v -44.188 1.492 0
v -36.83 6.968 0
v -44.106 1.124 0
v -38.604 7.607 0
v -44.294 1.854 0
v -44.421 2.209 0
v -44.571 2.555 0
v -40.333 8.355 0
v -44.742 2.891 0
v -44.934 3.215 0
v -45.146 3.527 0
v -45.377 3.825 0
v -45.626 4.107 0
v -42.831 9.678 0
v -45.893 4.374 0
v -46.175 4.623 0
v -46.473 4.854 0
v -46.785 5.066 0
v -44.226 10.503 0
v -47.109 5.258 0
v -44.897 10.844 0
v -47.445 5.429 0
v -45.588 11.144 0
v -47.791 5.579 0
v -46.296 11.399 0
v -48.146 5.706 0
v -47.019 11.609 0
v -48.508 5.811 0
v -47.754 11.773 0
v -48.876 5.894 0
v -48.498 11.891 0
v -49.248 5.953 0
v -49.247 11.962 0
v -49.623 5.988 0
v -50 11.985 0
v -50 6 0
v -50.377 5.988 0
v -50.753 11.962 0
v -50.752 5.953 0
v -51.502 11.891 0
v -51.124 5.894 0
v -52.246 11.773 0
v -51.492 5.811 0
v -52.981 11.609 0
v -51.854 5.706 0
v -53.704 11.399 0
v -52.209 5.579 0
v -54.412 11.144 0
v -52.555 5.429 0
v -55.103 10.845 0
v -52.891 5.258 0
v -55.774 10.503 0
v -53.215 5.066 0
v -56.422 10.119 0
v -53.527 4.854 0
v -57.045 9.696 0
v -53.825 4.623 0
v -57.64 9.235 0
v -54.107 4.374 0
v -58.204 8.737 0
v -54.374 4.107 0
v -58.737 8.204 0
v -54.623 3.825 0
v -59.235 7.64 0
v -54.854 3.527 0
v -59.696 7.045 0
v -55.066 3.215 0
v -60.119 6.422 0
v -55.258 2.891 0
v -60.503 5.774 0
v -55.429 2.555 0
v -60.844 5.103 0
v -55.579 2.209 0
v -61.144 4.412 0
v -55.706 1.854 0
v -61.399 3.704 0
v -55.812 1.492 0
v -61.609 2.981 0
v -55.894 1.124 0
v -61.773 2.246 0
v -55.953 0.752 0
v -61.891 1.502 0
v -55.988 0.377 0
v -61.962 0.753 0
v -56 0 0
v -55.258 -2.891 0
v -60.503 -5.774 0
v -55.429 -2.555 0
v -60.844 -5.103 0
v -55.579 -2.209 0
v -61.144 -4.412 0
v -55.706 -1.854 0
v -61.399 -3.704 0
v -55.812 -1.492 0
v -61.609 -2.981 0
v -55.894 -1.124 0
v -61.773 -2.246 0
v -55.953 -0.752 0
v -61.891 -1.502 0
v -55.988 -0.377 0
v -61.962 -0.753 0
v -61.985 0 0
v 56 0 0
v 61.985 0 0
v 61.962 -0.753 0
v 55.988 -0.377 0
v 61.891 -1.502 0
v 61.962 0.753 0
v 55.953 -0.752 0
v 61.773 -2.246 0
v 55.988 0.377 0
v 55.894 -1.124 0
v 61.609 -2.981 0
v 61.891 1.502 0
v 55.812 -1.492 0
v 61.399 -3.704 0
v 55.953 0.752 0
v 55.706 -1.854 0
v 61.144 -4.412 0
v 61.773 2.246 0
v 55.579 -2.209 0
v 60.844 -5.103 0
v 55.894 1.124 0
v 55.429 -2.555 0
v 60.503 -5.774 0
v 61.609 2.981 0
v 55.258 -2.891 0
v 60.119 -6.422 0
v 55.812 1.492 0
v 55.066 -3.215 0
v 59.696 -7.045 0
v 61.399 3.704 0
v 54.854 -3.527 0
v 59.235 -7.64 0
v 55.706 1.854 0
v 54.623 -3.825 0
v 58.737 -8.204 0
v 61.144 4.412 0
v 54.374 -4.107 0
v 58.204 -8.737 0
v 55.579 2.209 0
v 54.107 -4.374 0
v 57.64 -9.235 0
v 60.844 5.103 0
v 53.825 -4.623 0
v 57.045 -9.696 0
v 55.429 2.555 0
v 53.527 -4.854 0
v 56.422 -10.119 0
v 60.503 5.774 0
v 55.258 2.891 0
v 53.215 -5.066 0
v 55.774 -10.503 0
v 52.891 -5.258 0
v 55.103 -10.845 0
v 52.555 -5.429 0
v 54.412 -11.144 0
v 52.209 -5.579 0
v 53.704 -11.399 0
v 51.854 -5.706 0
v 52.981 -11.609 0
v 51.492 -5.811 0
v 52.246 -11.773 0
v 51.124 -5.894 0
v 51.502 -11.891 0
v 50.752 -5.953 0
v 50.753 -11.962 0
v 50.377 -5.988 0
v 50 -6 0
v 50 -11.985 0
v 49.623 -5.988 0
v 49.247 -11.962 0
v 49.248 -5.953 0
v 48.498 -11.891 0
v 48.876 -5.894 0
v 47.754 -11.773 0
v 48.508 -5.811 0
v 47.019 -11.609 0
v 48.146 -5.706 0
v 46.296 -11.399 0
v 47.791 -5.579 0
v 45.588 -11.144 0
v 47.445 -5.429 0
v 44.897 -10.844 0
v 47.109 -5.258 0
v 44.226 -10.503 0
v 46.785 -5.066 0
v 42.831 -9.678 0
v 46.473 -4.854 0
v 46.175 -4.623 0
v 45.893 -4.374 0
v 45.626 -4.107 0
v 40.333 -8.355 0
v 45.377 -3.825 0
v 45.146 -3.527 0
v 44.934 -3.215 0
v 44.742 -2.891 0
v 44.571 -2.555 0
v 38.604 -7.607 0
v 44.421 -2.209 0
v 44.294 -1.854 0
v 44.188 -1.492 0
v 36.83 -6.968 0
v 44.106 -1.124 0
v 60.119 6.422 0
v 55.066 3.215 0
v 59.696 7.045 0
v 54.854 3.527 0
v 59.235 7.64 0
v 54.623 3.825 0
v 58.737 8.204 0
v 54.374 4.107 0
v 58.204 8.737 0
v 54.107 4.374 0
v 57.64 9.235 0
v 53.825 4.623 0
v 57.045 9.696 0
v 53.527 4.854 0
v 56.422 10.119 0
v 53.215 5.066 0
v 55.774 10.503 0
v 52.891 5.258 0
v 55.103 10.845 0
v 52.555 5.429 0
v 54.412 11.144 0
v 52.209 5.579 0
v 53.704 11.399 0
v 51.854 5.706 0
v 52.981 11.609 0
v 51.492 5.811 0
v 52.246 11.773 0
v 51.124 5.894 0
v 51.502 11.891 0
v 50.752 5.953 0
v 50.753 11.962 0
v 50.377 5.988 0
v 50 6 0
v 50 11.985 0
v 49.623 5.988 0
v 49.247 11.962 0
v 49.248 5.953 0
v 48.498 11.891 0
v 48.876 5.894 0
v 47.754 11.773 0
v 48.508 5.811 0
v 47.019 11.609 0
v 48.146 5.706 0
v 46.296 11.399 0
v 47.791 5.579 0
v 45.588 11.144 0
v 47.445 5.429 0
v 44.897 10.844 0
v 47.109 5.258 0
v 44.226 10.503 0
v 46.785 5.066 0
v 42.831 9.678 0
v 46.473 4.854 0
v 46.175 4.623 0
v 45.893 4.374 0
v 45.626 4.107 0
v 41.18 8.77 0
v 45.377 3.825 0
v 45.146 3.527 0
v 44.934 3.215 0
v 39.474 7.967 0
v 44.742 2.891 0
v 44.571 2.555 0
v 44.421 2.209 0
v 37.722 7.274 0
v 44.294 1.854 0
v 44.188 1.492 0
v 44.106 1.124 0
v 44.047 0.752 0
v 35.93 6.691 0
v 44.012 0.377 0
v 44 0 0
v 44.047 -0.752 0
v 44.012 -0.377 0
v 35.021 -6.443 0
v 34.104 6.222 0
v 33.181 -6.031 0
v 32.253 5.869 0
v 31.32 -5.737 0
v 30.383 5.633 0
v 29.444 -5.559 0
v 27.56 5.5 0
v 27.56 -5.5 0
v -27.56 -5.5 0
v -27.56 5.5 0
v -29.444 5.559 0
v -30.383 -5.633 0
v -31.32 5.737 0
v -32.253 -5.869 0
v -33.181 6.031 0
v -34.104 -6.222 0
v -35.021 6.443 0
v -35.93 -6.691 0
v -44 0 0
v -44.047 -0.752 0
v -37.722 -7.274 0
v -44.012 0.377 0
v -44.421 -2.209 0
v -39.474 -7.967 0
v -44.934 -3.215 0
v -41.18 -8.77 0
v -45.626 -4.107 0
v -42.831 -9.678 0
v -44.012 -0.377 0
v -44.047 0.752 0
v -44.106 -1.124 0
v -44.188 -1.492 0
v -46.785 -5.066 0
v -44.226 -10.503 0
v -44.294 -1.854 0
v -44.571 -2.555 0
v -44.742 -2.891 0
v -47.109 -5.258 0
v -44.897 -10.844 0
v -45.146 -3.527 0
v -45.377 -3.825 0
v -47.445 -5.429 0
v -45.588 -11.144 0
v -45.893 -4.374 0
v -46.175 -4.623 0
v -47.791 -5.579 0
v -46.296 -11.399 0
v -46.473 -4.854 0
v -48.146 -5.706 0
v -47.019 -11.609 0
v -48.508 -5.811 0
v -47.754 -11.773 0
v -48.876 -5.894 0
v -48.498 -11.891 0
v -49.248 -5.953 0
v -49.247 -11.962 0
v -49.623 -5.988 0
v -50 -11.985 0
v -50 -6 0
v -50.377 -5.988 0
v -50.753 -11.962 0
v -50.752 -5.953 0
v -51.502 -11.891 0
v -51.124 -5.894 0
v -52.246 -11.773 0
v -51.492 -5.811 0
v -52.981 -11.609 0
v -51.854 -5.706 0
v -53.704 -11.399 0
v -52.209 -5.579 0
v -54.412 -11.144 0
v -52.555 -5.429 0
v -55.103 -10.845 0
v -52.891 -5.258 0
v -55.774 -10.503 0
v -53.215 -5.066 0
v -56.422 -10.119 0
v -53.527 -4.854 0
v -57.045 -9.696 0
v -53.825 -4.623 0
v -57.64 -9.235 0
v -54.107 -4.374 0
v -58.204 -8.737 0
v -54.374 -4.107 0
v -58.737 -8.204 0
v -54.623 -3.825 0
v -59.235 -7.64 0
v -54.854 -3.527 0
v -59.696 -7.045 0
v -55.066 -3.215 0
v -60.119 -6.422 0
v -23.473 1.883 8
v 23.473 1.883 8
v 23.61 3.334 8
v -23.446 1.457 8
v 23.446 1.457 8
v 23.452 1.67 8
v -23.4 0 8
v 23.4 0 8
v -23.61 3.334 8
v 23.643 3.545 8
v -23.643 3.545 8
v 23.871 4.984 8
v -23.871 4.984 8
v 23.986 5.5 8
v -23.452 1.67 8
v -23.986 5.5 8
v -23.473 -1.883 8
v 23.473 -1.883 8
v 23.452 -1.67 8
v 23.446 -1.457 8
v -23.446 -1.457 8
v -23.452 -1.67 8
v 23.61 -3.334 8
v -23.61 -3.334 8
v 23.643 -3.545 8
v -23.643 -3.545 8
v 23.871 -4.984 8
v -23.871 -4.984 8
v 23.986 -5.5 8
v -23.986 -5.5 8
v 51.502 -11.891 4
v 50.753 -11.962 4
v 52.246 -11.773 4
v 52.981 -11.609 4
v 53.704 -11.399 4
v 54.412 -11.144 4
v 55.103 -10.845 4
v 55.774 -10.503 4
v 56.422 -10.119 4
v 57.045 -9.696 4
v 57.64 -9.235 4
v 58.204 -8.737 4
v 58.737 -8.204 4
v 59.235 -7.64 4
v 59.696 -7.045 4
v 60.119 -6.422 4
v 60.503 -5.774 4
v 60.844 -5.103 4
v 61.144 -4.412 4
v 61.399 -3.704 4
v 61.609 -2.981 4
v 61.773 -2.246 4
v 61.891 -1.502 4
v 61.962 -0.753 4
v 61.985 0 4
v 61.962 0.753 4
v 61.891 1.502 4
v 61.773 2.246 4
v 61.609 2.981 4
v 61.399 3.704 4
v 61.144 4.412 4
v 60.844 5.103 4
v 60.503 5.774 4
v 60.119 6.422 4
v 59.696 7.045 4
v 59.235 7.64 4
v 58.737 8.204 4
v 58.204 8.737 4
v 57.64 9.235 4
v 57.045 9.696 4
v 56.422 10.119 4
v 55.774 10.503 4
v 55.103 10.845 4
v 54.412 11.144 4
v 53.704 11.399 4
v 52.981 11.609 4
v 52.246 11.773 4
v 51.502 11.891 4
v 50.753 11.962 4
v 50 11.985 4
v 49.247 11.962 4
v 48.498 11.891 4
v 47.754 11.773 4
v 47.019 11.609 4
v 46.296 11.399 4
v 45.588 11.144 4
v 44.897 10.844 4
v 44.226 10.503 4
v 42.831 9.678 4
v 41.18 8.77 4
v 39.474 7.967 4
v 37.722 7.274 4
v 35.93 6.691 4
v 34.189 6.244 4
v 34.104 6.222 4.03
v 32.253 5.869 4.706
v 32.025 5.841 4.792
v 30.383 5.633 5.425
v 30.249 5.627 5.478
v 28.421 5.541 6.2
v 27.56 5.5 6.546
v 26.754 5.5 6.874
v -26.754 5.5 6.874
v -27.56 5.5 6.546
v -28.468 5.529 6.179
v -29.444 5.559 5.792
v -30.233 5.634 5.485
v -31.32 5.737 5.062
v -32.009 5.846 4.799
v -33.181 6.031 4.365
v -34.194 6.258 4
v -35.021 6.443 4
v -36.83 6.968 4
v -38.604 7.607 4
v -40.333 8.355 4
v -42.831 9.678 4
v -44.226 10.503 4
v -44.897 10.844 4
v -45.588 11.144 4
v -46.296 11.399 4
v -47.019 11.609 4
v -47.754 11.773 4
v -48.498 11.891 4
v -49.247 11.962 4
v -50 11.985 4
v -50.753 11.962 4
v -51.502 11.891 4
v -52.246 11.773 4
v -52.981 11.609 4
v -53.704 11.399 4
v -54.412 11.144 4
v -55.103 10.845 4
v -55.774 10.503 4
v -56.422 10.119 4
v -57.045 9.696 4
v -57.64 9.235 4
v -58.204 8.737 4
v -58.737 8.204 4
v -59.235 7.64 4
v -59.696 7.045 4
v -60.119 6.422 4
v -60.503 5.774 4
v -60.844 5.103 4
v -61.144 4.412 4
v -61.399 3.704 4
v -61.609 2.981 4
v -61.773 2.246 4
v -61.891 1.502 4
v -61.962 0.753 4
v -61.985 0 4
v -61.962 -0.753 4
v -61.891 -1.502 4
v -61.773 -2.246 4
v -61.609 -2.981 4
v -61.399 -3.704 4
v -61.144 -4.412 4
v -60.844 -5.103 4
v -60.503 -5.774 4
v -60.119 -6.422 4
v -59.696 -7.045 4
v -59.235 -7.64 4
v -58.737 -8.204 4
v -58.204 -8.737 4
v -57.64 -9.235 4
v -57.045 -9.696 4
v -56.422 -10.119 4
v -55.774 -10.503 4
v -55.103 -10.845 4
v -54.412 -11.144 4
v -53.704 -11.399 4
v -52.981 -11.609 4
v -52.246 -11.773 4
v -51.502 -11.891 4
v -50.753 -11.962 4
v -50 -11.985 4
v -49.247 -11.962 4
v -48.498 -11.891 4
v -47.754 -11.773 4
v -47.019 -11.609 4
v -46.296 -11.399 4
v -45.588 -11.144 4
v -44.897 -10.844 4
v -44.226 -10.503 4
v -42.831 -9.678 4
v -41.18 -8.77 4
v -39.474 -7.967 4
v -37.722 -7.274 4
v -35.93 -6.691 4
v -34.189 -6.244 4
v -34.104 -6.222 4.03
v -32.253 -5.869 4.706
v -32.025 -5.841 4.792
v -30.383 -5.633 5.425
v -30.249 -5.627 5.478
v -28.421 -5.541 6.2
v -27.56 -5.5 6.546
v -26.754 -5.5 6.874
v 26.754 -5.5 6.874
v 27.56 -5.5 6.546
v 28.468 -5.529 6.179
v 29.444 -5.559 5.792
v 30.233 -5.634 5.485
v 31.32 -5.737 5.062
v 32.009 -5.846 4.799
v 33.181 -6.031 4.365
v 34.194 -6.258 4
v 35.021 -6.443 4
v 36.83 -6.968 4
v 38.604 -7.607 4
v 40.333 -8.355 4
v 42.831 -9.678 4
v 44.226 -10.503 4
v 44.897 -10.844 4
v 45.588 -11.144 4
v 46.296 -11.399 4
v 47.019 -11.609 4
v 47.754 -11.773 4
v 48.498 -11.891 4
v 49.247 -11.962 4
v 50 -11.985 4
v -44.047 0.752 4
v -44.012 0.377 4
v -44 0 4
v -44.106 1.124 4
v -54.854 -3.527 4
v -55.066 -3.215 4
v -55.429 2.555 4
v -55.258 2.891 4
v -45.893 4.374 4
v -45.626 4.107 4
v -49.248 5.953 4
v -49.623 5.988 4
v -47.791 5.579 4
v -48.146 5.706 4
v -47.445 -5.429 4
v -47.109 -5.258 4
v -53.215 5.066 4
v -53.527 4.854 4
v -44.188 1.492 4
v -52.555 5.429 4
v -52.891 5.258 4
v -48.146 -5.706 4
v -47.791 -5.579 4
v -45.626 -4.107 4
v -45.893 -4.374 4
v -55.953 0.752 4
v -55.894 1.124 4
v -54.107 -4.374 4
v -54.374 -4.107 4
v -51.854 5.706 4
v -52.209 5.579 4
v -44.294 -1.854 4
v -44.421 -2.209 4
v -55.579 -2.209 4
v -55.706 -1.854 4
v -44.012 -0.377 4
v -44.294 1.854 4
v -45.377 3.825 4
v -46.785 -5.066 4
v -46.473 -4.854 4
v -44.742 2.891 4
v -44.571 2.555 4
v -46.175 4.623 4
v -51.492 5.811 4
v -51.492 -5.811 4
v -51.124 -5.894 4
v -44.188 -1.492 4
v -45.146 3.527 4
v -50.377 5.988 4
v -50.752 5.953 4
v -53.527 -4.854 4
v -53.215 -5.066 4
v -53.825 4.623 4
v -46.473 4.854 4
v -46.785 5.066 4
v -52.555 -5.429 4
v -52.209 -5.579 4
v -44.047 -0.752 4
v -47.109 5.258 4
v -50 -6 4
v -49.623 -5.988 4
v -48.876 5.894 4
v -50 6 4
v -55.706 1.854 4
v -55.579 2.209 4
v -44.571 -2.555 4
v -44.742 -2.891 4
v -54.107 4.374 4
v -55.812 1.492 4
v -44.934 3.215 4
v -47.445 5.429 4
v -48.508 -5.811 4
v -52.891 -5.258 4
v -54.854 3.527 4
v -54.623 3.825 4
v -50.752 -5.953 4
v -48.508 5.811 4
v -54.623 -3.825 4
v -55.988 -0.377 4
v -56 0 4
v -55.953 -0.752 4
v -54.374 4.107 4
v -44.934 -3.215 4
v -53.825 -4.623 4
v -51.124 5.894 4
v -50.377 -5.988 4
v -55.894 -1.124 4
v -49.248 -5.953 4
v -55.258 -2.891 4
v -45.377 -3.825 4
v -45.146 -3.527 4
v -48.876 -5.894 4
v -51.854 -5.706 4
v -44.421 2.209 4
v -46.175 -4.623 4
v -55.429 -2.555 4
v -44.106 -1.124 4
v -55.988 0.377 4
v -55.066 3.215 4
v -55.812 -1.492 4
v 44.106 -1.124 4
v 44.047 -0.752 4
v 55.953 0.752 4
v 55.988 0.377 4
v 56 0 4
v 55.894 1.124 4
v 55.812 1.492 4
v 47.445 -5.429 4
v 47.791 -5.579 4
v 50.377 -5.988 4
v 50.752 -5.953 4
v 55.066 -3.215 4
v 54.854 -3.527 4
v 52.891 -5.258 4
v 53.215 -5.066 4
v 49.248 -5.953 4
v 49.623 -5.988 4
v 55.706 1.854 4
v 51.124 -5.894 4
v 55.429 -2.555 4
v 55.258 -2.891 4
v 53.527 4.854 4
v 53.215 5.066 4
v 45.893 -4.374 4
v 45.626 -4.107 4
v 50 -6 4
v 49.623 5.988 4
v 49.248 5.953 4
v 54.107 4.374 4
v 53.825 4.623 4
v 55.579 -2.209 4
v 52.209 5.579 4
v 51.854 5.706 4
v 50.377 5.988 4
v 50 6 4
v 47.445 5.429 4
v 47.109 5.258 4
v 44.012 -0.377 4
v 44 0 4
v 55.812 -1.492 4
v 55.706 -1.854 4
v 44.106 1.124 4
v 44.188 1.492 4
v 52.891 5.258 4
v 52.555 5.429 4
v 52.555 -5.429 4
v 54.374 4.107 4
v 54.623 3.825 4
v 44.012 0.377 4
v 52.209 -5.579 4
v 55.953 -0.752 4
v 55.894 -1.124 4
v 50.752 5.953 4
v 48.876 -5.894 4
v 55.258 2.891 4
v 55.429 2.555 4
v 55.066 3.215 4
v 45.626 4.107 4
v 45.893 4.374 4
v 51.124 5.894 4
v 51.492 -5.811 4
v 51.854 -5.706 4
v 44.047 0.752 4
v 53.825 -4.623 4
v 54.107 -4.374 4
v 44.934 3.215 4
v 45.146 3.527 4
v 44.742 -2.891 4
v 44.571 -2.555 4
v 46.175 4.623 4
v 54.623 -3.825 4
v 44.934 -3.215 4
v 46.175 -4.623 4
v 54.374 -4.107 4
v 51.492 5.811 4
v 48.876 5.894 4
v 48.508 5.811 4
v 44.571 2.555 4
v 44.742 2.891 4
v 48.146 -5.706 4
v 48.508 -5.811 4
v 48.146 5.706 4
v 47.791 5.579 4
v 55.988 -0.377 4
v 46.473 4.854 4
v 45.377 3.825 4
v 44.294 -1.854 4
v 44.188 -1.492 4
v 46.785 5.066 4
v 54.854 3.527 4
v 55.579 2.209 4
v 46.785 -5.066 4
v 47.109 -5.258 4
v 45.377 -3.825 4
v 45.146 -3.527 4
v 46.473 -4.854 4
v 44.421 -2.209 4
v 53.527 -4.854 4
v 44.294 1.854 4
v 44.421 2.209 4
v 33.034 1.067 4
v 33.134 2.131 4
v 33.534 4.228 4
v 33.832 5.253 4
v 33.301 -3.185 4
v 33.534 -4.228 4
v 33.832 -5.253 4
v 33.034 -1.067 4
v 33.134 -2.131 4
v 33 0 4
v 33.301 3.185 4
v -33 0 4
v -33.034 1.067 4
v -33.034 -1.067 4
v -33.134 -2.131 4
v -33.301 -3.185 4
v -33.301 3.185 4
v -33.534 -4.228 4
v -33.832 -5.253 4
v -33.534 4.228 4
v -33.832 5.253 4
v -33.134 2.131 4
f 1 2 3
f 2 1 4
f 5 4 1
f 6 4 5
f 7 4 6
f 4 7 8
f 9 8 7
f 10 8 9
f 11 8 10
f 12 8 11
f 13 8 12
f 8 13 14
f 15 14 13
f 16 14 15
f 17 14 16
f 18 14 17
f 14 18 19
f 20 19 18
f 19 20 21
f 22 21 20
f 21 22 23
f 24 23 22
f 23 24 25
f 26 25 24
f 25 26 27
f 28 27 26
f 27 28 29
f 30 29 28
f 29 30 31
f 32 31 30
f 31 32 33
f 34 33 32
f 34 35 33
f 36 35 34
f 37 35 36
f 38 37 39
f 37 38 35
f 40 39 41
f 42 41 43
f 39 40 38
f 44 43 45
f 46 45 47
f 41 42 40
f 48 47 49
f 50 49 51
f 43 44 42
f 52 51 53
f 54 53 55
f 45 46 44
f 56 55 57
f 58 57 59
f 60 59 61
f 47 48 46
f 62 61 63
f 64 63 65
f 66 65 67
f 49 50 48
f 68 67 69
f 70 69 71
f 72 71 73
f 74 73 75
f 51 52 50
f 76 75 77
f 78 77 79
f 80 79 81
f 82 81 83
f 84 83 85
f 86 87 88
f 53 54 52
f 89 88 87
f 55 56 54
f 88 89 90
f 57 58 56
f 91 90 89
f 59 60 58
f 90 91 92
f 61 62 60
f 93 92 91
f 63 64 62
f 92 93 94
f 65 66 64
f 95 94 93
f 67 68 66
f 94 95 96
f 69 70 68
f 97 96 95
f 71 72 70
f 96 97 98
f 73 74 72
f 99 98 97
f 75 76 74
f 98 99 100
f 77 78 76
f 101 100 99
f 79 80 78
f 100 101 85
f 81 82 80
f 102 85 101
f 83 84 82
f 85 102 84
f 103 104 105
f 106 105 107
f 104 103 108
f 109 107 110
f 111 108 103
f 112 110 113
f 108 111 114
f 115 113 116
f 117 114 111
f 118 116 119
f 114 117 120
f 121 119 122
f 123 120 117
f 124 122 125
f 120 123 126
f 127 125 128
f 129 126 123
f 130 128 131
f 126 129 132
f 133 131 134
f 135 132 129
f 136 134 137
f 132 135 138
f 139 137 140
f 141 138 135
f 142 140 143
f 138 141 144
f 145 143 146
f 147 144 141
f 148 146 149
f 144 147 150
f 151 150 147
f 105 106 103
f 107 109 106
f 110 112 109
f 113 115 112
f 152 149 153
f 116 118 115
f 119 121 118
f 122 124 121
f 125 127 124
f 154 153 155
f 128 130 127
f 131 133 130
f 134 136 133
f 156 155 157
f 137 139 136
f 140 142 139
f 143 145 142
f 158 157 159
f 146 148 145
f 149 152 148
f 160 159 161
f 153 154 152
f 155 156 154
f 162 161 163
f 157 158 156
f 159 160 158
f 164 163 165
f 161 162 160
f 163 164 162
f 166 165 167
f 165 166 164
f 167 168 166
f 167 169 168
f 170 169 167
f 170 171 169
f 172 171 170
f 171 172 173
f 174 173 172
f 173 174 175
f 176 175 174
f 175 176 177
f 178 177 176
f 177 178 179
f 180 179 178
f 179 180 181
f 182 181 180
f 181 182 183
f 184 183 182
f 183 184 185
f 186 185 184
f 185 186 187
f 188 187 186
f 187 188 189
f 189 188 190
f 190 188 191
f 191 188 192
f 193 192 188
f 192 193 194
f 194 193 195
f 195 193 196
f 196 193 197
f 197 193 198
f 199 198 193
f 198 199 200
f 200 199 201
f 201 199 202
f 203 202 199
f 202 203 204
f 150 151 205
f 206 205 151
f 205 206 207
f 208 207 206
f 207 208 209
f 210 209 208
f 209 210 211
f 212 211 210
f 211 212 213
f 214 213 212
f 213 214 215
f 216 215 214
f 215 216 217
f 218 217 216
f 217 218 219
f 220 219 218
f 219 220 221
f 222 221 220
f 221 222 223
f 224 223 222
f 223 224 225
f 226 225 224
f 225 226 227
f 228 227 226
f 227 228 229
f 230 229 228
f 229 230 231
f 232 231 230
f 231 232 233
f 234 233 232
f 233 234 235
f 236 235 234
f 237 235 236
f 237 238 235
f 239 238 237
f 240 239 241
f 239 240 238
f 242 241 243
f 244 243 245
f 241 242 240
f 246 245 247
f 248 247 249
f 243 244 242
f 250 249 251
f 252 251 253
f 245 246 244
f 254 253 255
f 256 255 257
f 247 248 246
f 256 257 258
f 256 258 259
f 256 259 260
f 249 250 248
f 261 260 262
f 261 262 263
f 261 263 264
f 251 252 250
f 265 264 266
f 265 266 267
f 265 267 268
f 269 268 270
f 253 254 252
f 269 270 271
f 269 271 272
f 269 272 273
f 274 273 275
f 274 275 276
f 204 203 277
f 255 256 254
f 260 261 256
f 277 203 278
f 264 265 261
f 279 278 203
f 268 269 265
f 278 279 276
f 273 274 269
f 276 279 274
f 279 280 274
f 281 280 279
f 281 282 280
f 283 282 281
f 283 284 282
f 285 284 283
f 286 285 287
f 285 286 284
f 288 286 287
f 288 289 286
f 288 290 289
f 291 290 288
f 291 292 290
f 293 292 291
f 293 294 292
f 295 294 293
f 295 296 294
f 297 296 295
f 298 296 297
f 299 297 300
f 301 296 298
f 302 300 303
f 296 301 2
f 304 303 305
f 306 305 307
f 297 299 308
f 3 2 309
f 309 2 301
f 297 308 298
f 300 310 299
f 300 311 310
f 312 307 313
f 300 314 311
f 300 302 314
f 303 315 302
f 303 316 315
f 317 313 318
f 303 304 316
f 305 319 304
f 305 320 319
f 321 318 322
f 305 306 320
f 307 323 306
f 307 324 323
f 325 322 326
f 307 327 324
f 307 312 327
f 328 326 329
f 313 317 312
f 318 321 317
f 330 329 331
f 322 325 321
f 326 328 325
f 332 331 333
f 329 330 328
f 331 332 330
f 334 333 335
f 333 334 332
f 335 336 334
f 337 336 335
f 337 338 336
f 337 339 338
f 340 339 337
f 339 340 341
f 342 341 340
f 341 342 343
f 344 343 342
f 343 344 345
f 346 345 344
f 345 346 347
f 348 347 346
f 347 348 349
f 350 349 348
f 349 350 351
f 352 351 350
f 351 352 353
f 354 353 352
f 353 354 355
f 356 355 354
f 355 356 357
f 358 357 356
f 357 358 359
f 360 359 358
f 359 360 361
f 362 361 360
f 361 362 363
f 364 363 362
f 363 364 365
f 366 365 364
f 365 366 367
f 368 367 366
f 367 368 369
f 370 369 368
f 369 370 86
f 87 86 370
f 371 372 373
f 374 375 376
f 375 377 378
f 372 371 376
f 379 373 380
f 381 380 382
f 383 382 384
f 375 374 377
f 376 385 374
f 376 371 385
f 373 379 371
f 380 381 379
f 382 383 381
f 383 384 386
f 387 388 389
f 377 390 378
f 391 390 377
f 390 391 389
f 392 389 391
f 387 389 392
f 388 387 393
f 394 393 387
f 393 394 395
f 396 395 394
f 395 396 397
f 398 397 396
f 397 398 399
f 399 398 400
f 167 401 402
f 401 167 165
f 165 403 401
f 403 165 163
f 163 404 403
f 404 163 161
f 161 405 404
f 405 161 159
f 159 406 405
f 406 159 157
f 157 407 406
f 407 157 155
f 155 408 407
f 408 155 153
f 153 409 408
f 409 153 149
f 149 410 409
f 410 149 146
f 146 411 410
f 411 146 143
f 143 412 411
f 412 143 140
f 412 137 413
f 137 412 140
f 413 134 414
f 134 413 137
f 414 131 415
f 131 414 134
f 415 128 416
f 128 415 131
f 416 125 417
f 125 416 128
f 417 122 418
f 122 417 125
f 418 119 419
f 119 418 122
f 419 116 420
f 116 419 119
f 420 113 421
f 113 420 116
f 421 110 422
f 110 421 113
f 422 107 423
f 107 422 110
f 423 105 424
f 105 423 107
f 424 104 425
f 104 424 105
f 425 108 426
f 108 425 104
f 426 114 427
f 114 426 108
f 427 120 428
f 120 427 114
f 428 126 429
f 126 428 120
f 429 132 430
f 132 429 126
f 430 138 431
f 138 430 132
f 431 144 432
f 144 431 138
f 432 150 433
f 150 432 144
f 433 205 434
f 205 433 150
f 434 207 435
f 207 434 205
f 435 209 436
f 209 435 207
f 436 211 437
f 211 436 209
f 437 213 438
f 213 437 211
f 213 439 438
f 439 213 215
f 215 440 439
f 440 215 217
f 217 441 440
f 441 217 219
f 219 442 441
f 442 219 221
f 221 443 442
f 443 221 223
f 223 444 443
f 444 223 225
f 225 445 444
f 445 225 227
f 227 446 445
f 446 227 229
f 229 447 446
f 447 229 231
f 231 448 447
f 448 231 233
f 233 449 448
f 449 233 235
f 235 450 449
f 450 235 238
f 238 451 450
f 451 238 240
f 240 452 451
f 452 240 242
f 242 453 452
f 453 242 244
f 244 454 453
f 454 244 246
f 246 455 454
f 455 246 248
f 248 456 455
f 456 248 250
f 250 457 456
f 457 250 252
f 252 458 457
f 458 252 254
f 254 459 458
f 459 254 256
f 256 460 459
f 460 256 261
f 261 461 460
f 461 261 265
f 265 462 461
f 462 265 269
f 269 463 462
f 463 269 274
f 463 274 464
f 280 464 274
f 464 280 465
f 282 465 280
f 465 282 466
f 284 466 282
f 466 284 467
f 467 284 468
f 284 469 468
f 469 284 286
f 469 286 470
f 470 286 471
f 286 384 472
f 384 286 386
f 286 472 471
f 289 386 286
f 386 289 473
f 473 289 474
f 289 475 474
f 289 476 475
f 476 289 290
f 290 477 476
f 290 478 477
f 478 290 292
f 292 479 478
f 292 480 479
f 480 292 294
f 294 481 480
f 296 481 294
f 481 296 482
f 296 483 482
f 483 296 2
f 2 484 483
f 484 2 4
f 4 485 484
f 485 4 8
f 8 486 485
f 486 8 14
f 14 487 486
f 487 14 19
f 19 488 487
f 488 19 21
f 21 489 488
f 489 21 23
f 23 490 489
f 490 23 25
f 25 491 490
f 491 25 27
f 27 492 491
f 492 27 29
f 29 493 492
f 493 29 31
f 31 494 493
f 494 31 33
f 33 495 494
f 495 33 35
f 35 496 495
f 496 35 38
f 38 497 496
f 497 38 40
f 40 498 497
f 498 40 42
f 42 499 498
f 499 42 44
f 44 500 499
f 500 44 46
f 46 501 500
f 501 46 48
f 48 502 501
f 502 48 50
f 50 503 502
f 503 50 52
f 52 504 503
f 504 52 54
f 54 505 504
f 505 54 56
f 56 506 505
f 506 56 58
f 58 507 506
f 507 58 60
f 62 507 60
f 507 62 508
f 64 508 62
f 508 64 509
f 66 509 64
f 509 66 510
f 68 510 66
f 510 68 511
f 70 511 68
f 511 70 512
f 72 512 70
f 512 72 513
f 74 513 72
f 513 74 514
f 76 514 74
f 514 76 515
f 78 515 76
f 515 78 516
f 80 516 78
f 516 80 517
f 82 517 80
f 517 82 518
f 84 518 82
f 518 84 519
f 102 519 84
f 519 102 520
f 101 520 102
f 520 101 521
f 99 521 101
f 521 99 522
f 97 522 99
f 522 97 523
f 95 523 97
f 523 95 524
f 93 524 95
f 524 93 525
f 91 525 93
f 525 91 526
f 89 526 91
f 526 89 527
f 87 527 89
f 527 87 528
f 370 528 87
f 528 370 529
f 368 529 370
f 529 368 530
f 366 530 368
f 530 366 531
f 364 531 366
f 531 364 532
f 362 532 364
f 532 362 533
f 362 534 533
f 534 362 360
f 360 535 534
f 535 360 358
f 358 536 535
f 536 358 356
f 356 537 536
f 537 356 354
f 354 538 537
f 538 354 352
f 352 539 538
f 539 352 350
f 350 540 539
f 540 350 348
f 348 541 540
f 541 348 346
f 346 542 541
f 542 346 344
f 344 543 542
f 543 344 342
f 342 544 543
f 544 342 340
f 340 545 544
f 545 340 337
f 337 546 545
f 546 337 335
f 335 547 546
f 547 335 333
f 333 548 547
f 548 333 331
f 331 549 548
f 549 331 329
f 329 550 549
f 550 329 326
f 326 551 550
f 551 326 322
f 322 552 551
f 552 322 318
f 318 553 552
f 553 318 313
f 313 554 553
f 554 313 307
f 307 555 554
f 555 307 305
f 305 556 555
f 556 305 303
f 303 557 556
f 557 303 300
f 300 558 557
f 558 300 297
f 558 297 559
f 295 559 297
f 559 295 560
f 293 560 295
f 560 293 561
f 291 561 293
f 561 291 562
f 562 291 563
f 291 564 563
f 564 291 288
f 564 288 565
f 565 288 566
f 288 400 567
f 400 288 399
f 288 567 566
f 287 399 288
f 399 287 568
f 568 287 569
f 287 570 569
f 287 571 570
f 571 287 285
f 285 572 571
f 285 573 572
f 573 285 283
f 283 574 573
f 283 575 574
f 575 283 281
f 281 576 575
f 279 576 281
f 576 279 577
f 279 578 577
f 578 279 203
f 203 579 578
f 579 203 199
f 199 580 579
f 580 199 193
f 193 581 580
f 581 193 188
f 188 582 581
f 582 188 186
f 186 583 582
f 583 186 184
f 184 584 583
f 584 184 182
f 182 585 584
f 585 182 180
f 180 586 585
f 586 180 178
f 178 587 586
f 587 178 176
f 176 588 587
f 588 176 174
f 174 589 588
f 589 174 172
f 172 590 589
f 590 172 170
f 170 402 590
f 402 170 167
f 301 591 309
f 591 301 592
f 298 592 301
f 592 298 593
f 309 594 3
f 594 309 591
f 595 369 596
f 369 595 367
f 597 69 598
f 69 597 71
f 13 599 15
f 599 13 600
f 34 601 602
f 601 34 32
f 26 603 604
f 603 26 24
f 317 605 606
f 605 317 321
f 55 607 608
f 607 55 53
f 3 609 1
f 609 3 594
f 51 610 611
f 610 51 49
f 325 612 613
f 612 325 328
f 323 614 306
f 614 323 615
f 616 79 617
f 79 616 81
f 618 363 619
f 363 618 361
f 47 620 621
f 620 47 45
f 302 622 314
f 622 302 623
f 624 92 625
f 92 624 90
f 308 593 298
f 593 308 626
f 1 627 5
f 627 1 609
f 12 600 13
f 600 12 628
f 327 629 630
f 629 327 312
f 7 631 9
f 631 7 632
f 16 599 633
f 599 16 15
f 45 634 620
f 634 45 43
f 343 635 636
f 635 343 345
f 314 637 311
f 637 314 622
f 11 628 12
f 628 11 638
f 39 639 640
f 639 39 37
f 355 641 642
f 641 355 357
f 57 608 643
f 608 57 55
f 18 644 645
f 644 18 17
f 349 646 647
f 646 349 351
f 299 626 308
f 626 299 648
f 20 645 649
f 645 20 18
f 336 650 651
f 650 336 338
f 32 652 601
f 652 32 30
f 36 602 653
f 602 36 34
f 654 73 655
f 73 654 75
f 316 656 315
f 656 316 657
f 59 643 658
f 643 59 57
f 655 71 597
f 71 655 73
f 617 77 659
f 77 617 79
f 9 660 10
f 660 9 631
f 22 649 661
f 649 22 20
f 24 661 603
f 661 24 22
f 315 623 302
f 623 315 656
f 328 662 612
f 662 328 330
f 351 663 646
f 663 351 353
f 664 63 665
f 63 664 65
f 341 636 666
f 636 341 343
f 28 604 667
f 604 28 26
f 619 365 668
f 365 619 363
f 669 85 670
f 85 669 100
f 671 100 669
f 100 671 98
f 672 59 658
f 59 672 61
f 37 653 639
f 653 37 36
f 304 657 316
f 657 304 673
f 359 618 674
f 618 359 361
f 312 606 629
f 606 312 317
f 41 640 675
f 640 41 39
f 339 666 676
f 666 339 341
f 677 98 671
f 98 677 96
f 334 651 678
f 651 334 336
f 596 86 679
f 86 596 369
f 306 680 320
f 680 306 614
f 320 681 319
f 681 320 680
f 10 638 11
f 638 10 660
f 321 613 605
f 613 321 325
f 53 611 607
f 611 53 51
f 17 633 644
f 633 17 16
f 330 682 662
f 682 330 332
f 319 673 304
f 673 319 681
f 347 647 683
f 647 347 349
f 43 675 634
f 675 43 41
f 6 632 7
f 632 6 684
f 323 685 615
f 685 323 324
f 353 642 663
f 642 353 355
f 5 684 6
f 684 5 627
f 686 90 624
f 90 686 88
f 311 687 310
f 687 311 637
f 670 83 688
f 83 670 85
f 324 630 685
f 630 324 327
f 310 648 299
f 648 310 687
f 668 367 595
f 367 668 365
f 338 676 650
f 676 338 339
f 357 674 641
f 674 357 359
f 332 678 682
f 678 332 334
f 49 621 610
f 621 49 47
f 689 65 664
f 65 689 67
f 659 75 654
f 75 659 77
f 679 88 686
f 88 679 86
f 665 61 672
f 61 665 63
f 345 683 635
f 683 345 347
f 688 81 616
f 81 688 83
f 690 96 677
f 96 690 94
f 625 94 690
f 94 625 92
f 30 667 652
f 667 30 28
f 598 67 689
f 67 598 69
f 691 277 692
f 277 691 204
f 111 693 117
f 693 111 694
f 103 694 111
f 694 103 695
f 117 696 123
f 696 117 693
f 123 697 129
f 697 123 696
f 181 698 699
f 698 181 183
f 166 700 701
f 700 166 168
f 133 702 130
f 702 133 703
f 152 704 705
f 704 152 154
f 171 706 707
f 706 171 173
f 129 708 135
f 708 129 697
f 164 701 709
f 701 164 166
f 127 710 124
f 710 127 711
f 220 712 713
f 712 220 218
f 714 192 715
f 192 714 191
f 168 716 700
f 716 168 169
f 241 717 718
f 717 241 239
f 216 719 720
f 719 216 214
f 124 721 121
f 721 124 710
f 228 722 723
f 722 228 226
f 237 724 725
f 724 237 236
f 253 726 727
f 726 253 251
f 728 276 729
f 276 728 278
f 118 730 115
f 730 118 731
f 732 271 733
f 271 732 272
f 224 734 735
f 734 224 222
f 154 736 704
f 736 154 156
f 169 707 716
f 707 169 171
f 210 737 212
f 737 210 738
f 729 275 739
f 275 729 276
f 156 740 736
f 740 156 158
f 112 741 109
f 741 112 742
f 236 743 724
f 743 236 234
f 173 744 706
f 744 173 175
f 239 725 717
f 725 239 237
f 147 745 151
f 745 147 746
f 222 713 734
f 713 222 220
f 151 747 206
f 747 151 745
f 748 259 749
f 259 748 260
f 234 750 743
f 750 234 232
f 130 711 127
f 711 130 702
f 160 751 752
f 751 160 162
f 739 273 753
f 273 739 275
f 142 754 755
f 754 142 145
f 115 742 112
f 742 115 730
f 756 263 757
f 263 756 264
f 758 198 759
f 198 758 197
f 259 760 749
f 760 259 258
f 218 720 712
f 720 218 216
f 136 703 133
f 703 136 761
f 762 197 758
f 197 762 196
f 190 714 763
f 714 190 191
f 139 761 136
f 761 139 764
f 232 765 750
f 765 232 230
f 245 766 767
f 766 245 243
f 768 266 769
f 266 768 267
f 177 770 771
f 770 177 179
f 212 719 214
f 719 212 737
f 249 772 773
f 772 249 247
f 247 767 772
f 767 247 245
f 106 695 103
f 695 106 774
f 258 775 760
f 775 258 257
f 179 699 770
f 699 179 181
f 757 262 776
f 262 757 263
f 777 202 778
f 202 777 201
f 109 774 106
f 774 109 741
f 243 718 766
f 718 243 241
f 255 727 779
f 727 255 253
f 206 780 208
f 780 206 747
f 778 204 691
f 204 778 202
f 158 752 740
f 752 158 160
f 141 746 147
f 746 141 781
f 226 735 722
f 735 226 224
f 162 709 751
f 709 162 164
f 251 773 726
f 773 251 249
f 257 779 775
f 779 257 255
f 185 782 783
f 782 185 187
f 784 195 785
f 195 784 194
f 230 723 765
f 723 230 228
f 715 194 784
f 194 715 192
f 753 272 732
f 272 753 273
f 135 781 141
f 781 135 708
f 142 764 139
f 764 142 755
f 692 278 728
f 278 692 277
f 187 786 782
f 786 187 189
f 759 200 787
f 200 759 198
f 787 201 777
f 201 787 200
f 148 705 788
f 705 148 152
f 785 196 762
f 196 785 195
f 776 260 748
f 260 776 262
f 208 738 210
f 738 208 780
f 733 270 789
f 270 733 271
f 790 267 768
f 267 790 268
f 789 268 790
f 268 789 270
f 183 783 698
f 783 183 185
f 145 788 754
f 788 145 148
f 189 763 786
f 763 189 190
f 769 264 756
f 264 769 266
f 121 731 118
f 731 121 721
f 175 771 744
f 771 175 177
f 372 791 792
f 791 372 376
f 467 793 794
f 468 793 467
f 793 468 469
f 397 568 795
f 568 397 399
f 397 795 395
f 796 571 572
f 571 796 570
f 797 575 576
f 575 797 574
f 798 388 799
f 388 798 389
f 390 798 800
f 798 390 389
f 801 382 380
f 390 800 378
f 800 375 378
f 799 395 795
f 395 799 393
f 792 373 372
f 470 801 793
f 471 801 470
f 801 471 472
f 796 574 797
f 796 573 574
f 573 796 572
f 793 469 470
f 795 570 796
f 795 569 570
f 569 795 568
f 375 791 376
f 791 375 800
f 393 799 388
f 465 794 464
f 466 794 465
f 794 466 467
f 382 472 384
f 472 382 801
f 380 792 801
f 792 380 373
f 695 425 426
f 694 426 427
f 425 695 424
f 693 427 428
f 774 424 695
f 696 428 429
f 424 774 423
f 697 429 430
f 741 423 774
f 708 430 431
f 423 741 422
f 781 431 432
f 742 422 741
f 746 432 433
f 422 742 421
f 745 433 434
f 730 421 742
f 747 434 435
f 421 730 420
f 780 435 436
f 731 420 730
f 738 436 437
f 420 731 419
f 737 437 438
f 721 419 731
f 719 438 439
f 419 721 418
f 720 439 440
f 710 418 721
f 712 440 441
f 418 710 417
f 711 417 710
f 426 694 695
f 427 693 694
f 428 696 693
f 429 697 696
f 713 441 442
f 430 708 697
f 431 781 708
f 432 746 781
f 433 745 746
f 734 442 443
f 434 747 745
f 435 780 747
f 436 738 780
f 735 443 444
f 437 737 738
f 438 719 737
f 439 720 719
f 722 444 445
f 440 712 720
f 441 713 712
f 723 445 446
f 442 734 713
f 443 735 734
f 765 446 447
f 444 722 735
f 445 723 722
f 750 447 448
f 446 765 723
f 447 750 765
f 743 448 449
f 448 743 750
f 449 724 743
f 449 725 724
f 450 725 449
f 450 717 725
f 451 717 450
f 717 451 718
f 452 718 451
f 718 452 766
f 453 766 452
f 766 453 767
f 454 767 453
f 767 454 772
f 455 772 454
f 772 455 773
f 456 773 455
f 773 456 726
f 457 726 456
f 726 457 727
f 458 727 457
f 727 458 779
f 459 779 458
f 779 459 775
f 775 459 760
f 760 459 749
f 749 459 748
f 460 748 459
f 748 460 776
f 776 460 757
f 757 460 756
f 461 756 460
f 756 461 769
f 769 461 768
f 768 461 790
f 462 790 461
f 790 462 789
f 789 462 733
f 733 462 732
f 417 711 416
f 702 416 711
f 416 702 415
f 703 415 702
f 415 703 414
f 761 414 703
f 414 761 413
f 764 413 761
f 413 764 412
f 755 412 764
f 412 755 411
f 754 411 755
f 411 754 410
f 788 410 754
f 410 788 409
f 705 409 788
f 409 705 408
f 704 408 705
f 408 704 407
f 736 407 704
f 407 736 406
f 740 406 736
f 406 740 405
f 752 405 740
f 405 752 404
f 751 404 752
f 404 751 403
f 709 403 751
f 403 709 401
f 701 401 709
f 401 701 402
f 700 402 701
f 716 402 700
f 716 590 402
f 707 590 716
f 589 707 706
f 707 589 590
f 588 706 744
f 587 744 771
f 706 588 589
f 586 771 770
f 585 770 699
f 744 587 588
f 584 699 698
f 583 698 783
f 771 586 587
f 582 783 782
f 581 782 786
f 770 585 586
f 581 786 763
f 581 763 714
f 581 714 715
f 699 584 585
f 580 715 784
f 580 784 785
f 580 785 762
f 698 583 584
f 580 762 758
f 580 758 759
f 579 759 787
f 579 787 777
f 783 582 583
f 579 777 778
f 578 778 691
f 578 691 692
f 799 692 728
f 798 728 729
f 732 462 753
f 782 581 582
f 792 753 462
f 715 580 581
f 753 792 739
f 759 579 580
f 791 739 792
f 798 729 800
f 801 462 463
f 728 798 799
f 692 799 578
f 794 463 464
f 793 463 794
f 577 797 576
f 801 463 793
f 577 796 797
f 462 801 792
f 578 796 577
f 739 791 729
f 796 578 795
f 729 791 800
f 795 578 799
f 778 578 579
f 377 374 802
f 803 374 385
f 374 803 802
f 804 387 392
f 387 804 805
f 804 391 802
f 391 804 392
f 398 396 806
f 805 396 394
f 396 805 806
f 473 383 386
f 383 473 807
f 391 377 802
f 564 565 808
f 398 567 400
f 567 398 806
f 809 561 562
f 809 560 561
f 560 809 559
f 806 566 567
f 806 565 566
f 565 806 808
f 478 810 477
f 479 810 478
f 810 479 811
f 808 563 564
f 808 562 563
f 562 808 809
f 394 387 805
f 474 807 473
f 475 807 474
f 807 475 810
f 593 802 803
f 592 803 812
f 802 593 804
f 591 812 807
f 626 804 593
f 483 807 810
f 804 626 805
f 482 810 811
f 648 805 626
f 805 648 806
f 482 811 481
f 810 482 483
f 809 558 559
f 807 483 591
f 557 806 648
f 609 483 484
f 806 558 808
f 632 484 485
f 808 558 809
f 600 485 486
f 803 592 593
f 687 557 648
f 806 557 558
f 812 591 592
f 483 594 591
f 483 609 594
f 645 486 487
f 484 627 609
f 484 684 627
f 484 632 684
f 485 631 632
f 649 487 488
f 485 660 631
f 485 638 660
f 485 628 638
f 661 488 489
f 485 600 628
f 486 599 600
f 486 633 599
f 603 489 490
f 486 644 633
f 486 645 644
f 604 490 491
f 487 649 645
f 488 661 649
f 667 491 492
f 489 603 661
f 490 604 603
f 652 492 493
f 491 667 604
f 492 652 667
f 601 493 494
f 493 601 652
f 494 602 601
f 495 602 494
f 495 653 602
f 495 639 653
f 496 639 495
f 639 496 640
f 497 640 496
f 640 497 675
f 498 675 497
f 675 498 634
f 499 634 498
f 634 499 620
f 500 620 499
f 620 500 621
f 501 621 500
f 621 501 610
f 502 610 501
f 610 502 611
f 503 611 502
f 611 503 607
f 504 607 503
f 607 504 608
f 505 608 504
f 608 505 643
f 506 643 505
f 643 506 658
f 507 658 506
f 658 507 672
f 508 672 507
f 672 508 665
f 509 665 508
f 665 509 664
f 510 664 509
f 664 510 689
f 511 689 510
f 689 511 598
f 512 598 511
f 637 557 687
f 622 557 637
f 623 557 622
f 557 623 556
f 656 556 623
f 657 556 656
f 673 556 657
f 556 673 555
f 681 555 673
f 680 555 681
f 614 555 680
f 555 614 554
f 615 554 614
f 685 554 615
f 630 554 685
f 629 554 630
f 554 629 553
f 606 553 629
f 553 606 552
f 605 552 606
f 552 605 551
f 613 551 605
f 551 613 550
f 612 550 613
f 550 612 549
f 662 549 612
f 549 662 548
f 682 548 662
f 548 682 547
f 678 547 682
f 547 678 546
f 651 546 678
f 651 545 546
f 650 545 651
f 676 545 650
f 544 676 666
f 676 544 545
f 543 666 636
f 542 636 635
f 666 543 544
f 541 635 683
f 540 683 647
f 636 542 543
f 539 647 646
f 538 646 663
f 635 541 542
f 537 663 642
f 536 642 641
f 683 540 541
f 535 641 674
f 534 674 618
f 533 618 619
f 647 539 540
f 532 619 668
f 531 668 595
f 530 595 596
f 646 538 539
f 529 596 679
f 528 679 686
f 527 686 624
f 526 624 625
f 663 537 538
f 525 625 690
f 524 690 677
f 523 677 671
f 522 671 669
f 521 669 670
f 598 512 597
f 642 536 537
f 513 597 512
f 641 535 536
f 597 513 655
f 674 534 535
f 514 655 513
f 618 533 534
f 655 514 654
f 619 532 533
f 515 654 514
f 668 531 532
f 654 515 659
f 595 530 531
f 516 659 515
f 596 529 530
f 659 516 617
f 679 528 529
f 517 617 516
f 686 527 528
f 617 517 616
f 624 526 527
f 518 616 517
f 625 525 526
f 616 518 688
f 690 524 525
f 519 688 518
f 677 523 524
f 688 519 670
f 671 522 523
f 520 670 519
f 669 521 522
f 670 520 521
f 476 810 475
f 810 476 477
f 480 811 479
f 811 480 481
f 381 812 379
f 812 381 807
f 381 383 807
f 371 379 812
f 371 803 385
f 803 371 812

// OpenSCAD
//parameters

cuts_outs=1;//1=cutouts 0=no cutouts
pivots=0;//1=with pivots 0=no pivoits


$fn=100;
hole_dia=12;
blend_rad=30;//default 30
link_width=11;
hole_center=100;
link_thickness=8;
bonerad=12;
//

width=link_width+(blend_rad*2);
bonerad2=bonerad+blend_rad;
hole_rad=hole_dia/2;


module link () {
union(){
cube([hole_center,width,1],center=true);
translate([-hole_center/2,0,-2.5]) cylinder(  5, bonerad2, bonerad2,false);
translate([hole_center/2,0,-2.5]) cylinder(  5, bonerad2, bonerad2,false);
}
}

module dlink () {
offset(r=-blend_rad) projection(cut = false) link ();
}
difference(){
        linear_extrude(0,0,link_thickness) dlink ();
        translate([-hole_center/2,0,-5])cylinder(link_thickness+10,hole_rad,hole_rad,false);
        translate([hole_center/2,0,-5])cylinder(link_thickness+10,hole_rad,hole_rad,false);
            
        if (cuts_outs==1) translate([hole_center/2,0,link_thickness/2])cylinder((link_thickness/2)+1,bonerad+5,bonerad+17,false);
        if (cuts_outs==1) translate([-hole_center/2,0,link_thickness/2])cylinder((link_thickness/2)+1,bonerad+5,bonerad+17,false);
 }


if (pivots==1) translate([-hole_center/2,0,0])cylinder(link_thickness,hole_rad,hole_rad,false);
if (pivots==1) translate([hole_center/2,0,0])cylinder(link_thickness,hole_rad,hole_rad,false);
